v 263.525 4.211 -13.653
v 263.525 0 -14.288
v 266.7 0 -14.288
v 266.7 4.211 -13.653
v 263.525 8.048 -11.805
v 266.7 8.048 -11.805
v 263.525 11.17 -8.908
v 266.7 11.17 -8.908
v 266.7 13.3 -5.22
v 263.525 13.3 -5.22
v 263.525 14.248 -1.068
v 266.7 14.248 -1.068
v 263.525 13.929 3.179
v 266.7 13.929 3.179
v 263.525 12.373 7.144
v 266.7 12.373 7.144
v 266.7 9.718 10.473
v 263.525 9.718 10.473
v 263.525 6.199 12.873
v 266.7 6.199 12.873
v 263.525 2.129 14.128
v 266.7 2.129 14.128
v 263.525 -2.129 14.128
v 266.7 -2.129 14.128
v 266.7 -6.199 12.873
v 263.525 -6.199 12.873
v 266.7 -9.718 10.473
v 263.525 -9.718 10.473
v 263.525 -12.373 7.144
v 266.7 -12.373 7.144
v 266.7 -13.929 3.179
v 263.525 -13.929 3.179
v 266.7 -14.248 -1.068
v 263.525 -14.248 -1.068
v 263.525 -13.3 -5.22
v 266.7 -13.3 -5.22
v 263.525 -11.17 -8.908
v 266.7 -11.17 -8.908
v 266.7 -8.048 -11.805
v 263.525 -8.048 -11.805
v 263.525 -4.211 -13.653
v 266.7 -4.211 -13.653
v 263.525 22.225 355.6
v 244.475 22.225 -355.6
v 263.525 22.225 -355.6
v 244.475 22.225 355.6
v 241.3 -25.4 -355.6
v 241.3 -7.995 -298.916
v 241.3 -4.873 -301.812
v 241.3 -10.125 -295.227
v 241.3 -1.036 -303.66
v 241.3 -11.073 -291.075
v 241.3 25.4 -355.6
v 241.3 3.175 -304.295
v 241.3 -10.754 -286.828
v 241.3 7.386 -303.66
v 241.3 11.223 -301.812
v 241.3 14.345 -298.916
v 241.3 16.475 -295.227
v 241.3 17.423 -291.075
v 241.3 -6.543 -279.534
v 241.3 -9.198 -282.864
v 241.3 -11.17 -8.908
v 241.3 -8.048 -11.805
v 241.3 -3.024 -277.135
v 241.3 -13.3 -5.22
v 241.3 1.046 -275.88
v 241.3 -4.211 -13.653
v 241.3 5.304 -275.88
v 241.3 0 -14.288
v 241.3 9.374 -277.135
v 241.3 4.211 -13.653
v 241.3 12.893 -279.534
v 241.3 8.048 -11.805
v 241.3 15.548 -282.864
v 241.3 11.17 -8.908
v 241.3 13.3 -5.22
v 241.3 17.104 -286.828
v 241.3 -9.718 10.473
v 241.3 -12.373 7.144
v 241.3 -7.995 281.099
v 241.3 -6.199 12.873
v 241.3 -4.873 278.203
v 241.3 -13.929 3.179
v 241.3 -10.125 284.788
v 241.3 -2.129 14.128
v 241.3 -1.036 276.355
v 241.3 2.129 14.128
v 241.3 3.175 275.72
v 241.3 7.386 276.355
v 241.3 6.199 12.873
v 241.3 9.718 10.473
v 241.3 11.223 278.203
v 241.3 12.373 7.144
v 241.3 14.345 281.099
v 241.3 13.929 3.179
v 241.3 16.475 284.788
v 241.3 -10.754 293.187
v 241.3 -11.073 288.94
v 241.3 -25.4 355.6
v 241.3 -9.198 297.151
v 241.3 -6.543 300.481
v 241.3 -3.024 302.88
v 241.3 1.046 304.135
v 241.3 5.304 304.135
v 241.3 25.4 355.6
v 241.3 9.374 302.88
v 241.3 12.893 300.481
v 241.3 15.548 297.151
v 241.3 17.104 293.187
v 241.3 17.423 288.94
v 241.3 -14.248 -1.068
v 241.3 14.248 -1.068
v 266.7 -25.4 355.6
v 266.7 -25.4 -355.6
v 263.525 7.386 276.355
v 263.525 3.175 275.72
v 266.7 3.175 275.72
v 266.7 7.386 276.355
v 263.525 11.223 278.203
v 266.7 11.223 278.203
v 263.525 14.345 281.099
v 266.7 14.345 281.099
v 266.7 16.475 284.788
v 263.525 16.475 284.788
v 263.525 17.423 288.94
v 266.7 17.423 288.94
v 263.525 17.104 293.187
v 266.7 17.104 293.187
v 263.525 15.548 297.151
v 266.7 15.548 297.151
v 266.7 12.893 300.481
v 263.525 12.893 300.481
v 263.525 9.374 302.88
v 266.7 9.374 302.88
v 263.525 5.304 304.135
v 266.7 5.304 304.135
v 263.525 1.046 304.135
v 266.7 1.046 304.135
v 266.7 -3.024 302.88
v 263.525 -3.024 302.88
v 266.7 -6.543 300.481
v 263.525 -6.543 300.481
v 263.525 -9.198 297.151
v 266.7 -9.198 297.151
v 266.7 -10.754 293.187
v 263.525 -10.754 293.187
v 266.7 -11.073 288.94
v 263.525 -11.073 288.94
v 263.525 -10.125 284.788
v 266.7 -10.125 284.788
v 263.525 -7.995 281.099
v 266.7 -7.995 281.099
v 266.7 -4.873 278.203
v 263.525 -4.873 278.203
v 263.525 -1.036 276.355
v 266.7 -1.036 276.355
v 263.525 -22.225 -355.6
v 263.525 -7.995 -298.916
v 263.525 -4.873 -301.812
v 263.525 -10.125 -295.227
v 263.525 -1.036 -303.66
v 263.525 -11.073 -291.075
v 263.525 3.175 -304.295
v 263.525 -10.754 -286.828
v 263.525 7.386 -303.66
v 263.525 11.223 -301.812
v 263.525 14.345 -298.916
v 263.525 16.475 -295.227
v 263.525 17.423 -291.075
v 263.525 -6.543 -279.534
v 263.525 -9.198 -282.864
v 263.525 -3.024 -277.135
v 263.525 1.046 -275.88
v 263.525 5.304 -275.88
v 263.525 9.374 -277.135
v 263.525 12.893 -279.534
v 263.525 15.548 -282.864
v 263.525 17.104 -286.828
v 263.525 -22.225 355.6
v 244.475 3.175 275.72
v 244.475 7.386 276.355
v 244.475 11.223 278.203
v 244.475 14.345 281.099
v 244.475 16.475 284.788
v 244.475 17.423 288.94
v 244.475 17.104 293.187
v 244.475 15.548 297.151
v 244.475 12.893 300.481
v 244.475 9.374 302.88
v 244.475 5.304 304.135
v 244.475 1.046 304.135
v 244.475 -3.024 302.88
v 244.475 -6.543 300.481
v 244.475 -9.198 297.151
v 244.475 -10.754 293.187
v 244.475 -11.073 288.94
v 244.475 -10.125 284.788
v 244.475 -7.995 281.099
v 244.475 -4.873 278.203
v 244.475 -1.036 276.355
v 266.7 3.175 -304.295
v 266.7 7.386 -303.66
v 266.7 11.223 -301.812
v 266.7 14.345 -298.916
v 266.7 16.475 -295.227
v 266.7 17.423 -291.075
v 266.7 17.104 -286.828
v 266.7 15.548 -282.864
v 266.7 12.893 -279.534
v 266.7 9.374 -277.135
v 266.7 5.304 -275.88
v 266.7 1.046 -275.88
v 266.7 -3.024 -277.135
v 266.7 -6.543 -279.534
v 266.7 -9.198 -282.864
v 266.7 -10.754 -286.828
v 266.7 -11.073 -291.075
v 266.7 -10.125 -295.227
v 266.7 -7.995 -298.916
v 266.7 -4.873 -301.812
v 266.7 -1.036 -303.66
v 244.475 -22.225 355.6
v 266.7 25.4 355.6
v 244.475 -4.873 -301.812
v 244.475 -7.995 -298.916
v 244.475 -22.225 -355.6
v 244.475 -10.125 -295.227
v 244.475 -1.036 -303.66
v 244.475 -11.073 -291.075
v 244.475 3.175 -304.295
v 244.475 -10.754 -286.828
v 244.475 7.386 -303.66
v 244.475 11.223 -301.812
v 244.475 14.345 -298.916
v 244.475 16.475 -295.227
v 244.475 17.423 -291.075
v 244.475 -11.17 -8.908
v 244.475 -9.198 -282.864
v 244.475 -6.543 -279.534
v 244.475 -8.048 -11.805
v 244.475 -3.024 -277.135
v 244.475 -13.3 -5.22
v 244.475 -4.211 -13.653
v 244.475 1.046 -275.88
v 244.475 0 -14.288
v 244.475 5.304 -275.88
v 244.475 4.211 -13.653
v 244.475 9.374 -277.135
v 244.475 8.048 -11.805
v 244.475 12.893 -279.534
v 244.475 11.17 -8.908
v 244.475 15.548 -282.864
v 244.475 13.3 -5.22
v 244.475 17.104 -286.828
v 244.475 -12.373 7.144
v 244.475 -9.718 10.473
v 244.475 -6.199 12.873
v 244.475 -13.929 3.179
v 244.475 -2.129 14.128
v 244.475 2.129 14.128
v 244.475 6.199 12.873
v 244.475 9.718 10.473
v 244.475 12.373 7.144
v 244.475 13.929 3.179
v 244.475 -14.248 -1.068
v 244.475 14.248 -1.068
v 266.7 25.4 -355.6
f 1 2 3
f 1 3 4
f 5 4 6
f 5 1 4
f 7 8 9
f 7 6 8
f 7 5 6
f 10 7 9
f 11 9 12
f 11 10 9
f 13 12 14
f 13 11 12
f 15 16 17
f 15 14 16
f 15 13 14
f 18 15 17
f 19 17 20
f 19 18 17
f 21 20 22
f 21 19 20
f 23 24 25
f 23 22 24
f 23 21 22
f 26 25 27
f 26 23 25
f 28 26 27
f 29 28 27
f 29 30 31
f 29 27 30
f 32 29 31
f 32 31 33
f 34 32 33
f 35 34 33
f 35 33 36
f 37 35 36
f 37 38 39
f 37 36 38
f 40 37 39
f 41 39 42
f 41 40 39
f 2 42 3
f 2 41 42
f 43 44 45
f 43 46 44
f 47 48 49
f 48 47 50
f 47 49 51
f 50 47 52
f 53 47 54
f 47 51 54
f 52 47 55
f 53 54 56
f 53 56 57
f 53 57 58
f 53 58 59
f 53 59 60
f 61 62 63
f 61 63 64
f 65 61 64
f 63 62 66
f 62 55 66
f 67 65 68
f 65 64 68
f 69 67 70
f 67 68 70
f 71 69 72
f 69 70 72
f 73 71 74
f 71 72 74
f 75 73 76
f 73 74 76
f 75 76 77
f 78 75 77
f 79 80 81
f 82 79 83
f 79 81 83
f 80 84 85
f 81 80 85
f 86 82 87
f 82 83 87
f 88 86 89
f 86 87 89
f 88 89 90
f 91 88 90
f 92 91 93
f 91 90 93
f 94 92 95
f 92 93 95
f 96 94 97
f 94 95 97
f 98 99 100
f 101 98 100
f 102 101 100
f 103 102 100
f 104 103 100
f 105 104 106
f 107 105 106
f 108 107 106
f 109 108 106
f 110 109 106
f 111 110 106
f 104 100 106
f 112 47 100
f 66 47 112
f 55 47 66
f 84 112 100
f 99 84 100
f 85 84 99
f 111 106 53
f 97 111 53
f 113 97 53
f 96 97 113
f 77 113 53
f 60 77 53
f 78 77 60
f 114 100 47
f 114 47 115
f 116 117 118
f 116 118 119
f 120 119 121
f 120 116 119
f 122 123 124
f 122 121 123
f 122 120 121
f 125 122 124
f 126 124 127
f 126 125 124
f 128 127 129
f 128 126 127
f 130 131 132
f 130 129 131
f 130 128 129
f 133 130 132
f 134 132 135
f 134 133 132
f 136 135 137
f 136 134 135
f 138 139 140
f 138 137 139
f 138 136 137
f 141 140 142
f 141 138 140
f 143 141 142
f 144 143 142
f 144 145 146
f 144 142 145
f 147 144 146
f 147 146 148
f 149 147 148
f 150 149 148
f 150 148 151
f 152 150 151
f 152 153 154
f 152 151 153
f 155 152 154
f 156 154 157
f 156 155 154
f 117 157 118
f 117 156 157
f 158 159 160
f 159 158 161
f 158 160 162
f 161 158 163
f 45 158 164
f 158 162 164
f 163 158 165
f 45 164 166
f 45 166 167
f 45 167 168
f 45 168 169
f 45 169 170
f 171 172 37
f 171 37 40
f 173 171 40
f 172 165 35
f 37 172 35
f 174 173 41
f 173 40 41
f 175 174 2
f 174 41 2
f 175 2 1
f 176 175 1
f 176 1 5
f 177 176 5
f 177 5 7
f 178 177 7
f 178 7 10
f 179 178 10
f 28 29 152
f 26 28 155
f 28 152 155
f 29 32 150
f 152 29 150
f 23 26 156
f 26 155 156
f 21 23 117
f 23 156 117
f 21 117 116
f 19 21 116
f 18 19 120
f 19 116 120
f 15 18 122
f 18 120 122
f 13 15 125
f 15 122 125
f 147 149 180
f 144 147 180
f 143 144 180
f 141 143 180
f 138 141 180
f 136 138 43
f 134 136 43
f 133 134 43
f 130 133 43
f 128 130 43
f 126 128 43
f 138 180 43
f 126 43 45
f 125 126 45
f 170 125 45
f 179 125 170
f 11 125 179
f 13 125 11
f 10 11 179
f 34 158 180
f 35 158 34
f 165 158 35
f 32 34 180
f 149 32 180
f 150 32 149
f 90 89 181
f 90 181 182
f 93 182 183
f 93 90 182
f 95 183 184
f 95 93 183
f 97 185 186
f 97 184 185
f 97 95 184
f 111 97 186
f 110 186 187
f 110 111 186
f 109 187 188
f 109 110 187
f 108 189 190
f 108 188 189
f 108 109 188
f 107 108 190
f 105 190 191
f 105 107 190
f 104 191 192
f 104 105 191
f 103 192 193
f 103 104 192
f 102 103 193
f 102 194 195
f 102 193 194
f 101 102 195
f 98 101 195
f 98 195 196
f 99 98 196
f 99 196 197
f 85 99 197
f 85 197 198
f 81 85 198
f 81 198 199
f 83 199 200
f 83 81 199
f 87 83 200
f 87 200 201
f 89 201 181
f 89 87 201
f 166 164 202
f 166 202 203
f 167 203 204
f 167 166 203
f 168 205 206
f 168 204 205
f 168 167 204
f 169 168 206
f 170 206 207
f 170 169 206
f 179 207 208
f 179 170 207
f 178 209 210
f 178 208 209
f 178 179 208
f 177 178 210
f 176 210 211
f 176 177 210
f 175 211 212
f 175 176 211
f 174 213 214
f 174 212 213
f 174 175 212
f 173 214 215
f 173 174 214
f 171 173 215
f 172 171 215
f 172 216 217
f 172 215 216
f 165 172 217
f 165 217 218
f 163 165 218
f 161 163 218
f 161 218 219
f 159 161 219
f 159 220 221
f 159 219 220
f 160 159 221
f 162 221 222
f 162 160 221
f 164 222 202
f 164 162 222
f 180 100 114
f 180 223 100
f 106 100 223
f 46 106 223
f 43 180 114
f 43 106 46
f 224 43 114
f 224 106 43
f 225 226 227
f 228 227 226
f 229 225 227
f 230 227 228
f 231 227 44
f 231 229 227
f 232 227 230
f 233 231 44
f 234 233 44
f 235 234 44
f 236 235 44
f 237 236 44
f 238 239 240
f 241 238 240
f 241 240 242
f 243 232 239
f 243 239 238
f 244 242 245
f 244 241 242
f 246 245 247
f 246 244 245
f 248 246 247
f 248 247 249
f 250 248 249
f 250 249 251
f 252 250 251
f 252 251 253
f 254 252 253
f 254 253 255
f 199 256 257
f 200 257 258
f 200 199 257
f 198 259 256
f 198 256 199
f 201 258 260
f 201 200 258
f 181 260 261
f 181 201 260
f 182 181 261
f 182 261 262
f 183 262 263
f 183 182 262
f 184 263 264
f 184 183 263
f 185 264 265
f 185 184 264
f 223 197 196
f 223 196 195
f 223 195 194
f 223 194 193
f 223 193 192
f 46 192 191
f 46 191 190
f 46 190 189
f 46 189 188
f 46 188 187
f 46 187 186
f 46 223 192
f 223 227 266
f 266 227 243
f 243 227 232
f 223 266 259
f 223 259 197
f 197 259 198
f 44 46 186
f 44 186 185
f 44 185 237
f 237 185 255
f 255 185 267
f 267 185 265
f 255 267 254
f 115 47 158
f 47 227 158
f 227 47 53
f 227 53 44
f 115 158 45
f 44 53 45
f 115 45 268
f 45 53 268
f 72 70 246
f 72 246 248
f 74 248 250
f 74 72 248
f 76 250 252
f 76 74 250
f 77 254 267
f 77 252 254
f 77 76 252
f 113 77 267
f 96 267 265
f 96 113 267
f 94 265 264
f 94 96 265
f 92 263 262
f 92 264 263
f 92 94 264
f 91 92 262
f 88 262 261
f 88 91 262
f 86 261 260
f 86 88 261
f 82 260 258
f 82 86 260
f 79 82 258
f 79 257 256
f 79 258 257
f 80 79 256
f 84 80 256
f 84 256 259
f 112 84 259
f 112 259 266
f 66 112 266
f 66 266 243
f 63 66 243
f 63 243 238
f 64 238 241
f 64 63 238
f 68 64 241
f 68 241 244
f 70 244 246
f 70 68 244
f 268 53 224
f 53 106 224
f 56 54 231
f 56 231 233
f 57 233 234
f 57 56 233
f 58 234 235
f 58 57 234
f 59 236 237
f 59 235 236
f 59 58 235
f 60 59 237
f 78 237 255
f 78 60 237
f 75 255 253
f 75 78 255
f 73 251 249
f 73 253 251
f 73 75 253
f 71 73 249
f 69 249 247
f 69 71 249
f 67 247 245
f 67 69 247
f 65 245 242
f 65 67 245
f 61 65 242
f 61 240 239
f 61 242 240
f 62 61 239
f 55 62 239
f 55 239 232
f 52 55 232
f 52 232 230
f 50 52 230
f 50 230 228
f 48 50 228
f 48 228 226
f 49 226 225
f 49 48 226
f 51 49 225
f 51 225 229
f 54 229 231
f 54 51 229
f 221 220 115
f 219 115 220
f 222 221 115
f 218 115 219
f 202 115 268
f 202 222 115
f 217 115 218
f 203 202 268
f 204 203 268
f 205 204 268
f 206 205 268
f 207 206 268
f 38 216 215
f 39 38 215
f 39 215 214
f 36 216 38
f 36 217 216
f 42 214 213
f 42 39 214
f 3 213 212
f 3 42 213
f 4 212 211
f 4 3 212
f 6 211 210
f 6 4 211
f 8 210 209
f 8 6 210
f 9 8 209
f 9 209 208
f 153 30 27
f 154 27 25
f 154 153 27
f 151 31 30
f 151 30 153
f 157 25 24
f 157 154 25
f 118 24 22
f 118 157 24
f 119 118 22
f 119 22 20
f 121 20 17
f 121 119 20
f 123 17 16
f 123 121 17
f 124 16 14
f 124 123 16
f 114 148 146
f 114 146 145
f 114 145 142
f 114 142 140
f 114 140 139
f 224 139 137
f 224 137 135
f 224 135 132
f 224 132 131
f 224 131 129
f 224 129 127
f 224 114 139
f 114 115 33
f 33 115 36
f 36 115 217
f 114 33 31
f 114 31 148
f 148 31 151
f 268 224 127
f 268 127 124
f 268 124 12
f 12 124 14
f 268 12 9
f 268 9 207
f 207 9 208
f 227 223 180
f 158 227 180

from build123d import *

# Parameters (mm, degrees)
SKETCH1_W           = 25.4
SKETCH1_H           = 50.8
SKETCH1_W_2         = 19.05
SKETCH1_H_2         = 44.45
BOSS_EXTRUDE1_DEPTH = 355.6
SKETCH2_R           = 14.2875
CUT_EXTRUDE1_DEPTH  = 446.225122831


with BuildPart() as part:
    # Sketch1 → Boss-Extrude1 (new body)
    with BuildSketch(Plane.XY):
        with Locations((254, 0)):
            Rectangle(SKETCH1_W, SKETCH1_H)
        with Locations((254, 0)):
            Rectangle(SKETCH1_W_2, SKETCH1_H_2, mode=Mode.SUBTRACT)
    boss_extrude1 = extrude(amount=BOSS_EXTRUDE1_DEPTH)

    # Mirror1: Boss-Extrude1 across plane
    add(boss_extrude1.mirror(Plane.XY))

    # Sketch2 → Cut-Extrude1 (cut, through all)
    with BuildSketch(Plane(origin=(0, 0, 0), x_dir=(0, 0, -1), z_dir=(1, 0, 0))):
        with Locations((290.007440579, 3.175)):
            Circle(SKETCH2_R)
        Circle(SKETCH2_R)
        with Locations((-290.007440579, 3.175)):
            Circle(SKETCH2_R)
    extrude(amount=CUT_EXTRUDE1_DEPTH, mode=Mode.SUBTRACT)


solid = part.part
